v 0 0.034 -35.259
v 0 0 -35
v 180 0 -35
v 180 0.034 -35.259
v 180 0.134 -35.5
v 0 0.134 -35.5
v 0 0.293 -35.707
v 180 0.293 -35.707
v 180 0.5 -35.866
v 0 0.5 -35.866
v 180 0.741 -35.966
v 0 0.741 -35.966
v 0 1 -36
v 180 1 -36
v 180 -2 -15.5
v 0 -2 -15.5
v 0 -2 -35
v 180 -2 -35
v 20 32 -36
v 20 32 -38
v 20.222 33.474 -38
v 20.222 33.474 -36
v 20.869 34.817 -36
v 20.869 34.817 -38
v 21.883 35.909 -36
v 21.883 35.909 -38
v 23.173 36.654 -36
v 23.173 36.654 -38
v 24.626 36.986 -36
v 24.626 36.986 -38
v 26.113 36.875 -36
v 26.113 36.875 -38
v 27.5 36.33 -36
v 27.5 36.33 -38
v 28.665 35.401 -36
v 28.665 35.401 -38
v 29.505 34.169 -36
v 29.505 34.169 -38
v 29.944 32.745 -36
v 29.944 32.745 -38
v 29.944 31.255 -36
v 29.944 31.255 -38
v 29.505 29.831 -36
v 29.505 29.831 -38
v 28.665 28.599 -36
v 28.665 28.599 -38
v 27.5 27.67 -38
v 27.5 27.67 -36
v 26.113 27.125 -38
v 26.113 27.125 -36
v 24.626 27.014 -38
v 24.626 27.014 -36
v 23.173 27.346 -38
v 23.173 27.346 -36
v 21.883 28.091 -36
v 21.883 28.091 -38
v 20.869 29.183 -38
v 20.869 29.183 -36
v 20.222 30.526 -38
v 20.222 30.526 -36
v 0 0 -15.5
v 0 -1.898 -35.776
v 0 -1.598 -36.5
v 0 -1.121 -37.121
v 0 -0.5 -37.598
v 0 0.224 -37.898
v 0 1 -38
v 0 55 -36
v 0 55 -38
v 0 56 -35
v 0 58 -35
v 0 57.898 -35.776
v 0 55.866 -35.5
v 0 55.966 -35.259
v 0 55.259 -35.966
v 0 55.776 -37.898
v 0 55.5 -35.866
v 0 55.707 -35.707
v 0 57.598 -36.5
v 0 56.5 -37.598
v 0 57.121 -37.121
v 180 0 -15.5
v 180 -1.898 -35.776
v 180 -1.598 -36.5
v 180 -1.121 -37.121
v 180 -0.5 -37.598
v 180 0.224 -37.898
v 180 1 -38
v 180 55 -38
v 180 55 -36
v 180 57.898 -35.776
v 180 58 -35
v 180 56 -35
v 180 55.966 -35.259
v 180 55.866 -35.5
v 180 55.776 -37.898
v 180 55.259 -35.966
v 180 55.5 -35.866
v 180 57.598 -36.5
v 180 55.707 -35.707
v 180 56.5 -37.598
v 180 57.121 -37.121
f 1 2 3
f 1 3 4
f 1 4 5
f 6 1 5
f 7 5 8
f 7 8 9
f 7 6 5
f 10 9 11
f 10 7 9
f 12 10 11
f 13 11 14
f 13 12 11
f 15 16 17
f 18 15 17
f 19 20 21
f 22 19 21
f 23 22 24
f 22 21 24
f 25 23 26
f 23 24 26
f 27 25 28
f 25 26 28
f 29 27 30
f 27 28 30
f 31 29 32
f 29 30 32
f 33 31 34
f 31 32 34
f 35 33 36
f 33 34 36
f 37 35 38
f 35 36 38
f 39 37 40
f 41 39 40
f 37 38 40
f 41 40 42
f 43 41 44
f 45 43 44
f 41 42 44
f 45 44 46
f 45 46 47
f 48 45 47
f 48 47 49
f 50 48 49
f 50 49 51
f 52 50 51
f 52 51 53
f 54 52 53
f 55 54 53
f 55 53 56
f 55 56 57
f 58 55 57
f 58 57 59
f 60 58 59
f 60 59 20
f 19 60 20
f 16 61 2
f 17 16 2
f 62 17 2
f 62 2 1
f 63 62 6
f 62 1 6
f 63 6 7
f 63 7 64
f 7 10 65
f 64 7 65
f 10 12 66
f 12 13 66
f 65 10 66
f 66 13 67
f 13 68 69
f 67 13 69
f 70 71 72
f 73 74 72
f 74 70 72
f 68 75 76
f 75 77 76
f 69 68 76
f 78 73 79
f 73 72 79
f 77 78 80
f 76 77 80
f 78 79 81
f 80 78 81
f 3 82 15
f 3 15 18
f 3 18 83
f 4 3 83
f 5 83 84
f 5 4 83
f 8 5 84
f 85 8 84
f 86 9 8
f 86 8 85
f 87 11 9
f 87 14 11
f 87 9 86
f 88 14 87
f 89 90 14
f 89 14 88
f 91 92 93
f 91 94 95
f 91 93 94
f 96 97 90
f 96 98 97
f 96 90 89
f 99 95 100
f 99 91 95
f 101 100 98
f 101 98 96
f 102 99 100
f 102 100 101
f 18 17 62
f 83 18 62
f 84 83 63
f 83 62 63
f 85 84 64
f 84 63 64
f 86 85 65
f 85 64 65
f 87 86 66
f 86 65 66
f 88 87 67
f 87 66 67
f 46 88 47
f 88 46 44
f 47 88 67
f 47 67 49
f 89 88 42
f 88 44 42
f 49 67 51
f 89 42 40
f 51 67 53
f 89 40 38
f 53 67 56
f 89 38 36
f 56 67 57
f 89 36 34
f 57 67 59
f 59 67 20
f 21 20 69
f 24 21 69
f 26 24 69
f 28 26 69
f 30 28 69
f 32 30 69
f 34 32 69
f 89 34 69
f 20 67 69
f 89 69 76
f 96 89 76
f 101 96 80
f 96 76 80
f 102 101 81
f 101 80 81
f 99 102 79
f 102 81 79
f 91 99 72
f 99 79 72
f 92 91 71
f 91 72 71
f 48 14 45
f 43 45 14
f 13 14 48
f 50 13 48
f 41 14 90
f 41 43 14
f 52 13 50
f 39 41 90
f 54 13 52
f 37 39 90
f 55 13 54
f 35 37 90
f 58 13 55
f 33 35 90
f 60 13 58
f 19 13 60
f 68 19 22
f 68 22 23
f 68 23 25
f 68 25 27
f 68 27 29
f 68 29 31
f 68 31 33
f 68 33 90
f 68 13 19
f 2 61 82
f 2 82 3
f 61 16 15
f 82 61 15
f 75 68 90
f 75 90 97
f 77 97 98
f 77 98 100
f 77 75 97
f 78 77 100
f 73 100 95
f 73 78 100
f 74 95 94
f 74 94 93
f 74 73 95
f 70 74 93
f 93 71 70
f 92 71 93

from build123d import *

# Parameters (mm, degrees)
EXTRUDE_1_DEPTH     = 180
SKETCH_2_W          = 180
SKETCH_2_H          = 17.5
CUT_EXTRUDE_1_DEPTH = 45
SKETCH_3_W          = 180
SKETCH_3_H          = 37
CUT_EXTRUDE_2_DEPTH = 25
SKETCH_4_R          = 5
CUT_EXTRUDE_3_DEPTH = 10


with BuildPart() as part:
    # Эскиз1 → Вытянуть-Тонкостенный1 (new body)
    with BuildSketch(Plane(origin=(0, 0, 0), x_dir=(0, 0, -1), z_dir=(1, 0, 0))):
        with BuildLine():
            Line((-2, 55), (-2, 1))
            ThreePointArc((-2, 1), (-1.121320344, -1.121320344), (1, -2))
            Line((1, -2), (35, -2))
            ThreePointArc((35, -2), (37.121320344, -1.121320344), (38, 1))
            Line((38, 1), (38, 55))
            ThreePointArc((38, 55), (37.121320344, 57.121320344), (35, 58))
            Line((35, 58), (1, 58))
            ThreePointArc((1, 58), (-1.121320344, 57.121320344), (-2, 55))
        make_face()
        with BuildLine():
            Line((0, 55), (0, 1))
            ThreePointArc((0, 1), (0.292893219, 0.292893219), (1, 0))
            Line((1, 0), (35, 0))
            ThreePointArc((35, 0), (35.707106781, 0.292893219), (36, 1))
            Line((36, 1), (36, 55))
            ThreePointArc((36, 55), (35.707106781, 55.707106781), (35, 56))
            Line((35, 56), (1, 56))
            ThreePointArc((1, 56), (0.292893219, 55.707106781), (0, 55))
        make_face(mode=Mode.SUBTRACT)
    extrude(amount=EXTRUDE_1_DEPTH)

    # Эскиз2 → Вырез-Вытянуть1 (cut)
    with BuildSketch(Plane.XZ.offset(2)):
        with Locations((90, -6.75)):
            Rectangle(SKETCH_2_W, SKETCH_2_H)
    extrude(amount=-CUT_EXTRUDE_1_DEPTH, mode=Mode.SUBTRACT)

    # Эскиз3 → Вырез-Вытянуть2 (cut)
    with BuildSketch(Plane(origin=(0, 58, 0), x_dir=(1, 0, 0), z_dir=(0, 1, 0))):
        with Locations((90, 16.5)):
            Rectangle(SKETCH_3_W, SKETCH_3_H)
    extrude(amount=-CUT_EXTRUDE_2_DEPTH, mode=Mode.SUBTRACT)

    # Эскиз4 → Вырез-Вытянуть3 (cut)
    with BuildSketch(Plane(origin=(0, 0, -38), x_dir=(-1, 0, 0), z_dir=(0, 0, -1))):
        with Locations((-25, 32)):
            Circle(SKETCH_4_R)
    extrude(amount=-CUT_EXTRUDE_3_DEPTH, mode=Mode.SUBTRACT)


solid = part.part
